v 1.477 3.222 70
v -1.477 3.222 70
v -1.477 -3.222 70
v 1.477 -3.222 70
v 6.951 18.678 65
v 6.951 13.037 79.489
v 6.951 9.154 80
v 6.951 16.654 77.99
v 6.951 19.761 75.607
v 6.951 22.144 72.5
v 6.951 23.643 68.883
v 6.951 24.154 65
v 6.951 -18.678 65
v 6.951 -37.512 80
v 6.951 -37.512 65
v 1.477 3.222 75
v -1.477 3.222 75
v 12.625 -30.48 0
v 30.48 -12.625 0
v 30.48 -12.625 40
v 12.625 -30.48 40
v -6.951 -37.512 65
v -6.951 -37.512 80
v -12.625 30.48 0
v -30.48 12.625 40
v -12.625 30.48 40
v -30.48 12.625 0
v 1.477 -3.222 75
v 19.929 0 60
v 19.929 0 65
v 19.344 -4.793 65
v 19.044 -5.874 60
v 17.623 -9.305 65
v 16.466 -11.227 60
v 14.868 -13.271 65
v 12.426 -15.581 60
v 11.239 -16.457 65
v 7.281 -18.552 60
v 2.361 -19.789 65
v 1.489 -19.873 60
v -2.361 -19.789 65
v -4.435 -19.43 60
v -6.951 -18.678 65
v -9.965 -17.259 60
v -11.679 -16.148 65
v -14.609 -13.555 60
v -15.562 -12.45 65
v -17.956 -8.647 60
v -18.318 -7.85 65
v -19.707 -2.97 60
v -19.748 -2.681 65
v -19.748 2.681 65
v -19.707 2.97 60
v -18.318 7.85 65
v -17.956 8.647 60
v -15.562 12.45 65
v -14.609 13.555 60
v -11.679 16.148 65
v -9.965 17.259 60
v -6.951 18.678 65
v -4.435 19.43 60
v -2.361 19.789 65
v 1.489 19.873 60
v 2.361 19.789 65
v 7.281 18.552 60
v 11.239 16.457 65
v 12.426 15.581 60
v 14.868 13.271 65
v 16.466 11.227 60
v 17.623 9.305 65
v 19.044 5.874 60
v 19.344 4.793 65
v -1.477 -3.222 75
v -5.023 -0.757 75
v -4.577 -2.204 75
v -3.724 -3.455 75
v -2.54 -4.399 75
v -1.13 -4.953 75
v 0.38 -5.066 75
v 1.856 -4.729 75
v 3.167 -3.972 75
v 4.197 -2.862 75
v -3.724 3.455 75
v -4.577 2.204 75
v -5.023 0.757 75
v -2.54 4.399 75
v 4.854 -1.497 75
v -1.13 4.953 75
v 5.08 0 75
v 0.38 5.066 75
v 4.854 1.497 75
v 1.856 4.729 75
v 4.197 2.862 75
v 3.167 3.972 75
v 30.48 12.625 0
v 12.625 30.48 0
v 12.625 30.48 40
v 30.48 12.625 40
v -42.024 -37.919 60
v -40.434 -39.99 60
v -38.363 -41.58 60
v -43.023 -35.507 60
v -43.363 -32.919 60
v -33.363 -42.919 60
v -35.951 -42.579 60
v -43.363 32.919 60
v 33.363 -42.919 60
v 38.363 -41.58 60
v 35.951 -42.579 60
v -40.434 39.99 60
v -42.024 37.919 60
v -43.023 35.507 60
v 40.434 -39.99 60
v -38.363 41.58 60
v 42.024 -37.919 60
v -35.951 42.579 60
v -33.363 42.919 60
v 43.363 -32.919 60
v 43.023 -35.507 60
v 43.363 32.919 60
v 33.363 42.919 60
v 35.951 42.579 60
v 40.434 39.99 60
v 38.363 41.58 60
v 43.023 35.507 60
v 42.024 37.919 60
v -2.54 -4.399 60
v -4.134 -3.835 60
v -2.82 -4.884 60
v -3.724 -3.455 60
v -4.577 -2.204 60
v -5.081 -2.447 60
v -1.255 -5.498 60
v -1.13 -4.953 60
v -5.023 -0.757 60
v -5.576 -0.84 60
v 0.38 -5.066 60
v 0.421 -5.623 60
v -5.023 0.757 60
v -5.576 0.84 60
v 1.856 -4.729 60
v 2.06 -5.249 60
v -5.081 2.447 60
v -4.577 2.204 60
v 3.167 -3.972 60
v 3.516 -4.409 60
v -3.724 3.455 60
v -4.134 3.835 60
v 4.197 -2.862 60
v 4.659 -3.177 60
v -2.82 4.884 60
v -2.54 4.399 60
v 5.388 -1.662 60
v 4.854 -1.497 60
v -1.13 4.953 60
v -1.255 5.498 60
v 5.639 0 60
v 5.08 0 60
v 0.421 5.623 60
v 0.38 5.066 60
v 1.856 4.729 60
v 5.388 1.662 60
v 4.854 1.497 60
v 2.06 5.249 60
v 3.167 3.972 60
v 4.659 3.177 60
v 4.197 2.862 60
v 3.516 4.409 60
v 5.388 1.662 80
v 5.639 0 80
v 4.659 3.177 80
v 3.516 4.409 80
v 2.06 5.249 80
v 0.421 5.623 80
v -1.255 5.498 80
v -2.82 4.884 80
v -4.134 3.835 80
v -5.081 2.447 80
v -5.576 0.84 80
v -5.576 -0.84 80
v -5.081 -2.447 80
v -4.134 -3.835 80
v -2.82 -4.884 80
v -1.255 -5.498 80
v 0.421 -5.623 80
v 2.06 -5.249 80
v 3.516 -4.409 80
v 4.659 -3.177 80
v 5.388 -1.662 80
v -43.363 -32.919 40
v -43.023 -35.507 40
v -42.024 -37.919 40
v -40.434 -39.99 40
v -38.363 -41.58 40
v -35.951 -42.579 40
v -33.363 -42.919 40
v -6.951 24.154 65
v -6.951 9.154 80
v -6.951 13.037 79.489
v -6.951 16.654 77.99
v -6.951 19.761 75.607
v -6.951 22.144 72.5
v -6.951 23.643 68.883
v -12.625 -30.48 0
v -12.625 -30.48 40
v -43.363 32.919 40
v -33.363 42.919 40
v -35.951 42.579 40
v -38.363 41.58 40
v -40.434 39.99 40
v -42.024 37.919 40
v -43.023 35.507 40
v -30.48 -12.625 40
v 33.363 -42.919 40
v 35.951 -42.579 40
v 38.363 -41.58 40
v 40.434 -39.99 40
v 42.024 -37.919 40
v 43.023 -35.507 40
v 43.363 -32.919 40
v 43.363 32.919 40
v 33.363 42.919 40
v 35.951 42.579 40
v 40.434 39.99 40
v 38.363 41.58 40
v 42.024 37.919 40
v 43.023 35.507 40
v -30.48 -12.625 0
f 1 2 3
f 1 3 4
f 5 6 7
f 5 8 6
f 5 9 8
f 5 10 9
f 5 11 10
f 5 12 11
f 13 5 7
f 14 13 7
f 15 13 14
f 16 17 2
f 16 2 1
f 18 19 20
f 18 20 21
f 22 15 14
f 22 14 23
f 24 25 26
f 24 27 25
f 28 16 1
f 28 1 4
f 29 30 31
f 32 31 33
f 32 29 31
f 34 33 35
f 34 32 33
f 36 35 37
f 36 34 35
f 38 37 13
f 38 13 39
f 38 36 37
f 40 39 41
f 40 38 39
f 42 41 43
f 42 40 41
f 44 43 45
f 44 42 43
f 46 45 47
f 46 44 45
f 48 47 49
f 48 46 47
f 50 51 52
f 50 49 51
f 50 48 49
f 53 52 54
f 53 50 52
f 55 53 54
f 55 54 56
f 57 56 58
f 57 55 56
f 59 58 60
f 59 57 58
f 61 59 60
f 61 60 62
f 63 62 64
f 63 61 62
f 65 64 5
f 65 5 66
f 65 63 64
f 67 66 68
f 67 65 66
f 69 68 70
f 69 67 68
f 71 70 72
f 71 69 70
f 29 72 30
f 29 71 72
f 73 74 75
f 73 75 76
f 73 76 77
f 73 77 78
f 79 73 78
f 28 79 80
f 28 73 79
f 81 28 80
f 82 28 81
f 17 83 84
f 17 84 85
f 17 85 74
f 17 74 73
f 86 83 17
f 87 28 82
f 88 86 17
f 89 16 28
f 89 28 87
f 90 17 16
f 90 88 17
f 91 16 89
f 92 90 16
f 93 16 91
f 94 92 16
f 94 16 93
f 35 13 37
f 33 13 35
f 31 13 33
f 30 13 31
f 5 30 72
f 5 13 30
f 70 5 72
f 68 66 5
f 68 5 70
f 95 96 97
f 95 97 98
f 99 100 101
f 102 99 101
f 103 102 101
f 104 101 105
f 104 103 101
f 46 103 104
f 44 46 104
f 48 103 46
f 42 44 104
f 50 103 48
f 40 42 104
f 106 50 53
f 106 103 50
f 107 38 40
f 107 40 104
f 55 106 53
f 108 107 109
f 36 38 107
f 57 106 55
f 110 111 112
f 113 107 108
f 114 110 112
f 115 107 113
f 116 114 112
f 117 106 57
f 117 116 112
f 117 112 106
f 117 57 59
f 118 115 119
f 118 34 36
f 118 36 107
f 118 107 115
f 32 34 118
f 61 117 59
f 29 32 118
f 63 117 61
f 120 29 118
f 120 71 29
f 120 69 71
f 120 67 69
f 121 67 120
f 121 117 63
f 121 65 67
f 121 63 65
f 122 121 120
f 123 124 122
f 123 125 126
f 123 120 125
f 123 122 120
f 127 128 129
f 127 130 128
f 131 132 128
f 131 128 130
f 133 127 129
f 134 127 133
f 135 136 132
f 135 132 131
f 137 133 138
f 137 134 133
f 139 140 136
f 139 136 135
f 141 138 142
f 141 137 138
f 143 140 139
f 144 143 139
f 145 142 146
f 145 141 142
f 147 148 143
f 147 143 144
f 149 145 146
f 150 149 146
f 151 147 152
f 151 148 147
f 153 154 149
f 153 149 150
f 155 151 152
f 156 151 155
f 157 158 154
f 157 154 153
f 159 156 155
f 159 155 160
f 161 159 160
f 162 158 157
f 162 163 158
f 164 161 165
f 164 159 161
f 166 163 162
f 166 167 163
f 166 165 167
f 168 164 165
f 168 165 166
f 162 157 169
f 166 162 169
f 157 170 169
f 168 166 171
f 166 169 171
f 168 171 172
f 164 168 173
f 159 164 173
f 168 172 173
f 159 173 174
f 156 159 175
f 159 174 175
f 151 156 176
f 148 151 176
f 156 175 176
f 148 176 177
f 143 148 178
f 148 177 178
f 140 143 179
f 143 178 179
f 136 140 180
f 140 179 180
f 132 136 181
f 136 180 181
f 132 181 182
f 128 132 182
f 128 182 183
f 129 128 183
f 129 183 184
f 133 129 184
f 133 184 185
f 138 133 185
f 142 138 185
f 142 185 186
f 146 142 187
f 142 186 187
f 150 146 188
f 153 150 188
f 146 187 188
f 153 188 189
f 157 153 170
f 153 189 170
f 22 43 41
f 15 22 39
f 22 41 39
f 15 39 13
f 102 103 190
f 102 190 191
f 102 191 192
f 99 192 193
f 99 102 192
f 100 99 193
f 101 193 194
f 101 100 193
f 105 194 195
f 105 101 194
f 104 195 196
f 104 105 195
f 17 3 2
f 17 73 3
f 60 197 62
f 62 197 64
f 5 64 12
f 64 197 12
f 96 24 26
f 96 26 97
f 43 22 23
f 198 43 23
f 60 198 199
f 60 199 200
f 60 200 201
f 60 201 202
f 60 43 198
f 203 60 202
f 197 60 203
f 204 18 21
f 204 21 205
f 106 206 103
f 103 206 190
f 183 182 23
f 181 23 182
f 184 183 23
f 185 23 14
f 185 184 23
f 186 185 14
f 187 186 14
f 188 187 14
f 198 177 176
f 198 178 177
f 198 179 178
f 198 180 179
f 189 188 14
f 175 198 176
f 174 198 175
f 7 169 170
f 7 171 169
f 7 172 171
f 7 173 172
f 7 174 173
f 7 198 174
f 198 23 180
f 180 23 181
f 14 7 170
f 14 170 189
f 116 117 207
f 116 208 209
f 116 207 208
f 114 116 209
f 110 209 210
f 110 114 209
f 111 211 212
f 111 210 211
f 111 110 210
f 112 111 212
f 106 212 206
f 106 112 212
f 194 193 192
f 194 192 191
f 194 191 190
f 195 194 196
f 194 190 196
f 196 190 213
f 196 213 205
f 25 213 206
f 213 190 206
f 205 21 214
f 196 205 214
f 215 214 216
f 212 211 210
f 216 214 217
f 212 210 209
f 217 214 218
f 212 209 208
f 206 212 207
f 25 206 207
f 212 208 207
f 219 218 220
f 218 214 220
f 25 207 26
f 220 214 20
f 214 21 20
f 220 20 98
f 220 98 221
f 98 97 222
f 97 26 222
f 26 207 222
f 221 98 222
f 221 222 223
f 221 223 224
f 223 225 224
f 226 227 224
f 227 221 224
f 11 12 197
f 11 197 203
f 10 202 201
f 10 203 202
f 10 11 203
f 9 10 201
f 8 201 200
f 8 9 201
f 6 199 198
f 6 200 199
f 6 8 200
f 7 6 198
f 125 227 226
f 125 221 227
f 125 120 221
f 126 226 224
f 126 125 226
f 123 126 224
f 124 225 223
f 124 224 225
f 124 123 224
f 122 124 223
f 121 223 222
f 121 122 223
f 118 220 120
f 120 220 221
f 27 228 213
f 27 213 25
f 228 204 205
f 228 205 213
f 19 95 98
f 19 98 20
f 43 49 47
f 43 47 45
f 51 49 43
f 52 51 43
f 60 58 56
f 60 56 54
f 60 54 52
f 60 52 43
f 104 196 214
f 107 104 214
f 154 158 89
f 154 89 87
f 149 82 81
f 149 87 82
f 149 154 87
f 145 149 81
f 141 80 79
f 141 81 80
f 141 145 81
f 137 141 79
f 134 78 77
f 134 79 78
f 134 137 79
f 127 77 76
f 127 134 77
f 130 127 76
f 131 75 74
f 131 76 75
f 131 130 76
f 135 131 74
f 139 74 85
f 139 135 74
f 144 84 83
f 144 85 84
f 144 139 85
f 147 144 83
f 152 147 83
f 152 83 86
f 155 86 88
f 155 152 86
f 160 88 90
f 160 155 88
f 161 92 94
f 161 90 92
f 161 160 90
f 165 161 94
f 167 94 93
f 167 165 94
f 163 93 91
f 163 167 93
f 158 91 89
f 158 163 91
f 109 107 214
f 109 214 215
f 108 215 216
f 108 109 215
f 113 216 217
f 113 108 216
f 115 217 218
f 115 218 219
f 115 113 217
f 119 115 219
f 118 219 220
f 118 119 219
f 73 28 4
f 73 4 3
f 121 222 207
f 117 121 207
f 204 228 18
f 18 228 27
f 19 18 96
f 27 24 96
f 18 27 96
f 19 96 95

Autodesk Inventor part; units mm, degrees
ref_plane "YZ Plane" through (0, 0, 0) normal (1, 0, 0) x (0, 1, 0)
ref_plane "XZ Plane" through (0, 0, 0) normal (0, 1, 0) x (-1, 0, 0)
ref_plane "XY Plane" through (0, 0, 0) normal (0, 0, 1) x (1, 0, 0)
sketch "Sketch1" plane through (0, 0, 0) normal (0, 0, 1) x (1, 0, 0)
  line L0 (-12.6252, -30.48) -> (-30.48, -12.6252)
  line L1 (-30.48, -12.6252) -> (-30.48, 12.6252)
  line L2 (-30.48, 12.6252) -> (-12.6252, 30.48)
  line L3 (-12.6252, 30.48) -> (12.6252, 30.48)
  line L4 (12.6252, 30.48) -> (30.48, 12.6252)
  line L5 (30.48, 12.6252) -> (30.48, -12.6252)
  line L6 (30.48, -12.6252) -> (12.6252, -30.48)
  line L7 (12.6252, -30.48) -> (-12.6252, -30.48)
  circle A0 centre (0, 0) radius 30.48
  line L8 (28.3719, -11.1385) -> (12.1858, -27.9381)
  line L9 (12.1858, -27.9381) -> (-11.1385, -28.3719)
  line L10 (-11.1385, -28.3719) -> (-27.9381, -12.1858)
  line L11 (-27.9381, -12.1858) -> (-28.3719, 11.1385)
  line L12 (-28.3719, 11.1385) -> (-12.1858, 27.9381)
  line L13 (-12.1858, 27.9381) -> (11.1385, 28.3719)
  line L14 (11.1385, 28.3719) -> (27.9381, 12.1858)
  line L15 (27.9381, 12.1858) -> (28.3719, -11.1385)
  point P0 (0, 0)
  point P1 (0, 30.48)
  dimension "d50" = 60.96
  dimension "d54" = 30.48
extrude "Extrusion1" add sketch "Sketch1" along normal blind 40
sketch "Sketch2" plane through (0, 0, 40) normal (0, 0, 1) x (1, 0, 0)
  line L0 (-43.3633, -42.9193) -> (43.3633, -42.9193)
  line L1 (43.3633, -42.9193) -> (43.3633, 42.9193)
  line L2 (43.3633, 42.9193) -> (-43.3633, 42.9193)
  line L3 (-43.3633, 42.9193) -> (-43.3633, -42.9193)
  line L4 (-43.3633, -42.9193) -> (43.3633, 42.9193) construction
  line L5 (43.3633, -42.9193) -> (-43.3633, 42.9193) construction
  point P0 (0, 0)
extrude "Extrusion2" add sketch "Sketch2" along normal blind 20
fillet "Fillet1" radius 10 4 edges at (43.3633, 42.9193, 50) (43.3633, -42.9193, 50) (-43.3633, 42.9193, 50) (-43.3633, -42.9193, 50)
sketch "Sketch3" plane through (0, 0, 60) normal (0, 0, 1) x (1, 0, 0)
  circle A0 centre (0, 0) radius 19.9292
extrude "Extrusion3" add sketch "Sketch3" along normal blind 5
sketch "Sketch4" plane through (0, 0, 65) normal (0, 0, 1) x (1, 0, 0)
  line L0 (6.9511, -37.5125) -> (-6.9511, -37.5125)
  line L1 (-6.9511, -37.5125) -> (-6.9511, 24.1539)
  line L2 (-6.9511, 24.1539) -> (6.9511, 24.1539)
  line L3 (6.9511, 24.1539) -> (6.9511, -37.5125)
  line L4 (6.9511, -37.5125) -> (-6.9511, 24.1539) construction
  line L5 (-6.9511, -37.5125) -> (6.9511, 24.1539) construction
  point P0 (0, 0)
  point P1 (0, -6.6793)
extrude "Extrusion4" add sketch "Sketch4" along normal blind 15
fillet "Fillet2" radius 15 1 edges at (0, 24.1539, 80)
sketch "Sketch5" plane through (0, 0, 80) normal (0, 0, 1) x (1, 0, 0)
  circle A0 centre (0, 0) radius 5.639
extrude "Extrusion5" cut sketch "Sketch5" against normal blind 20
sketch "Sketch6" plane through (0, 0, 60) normal (0, 0, 1) x (1, 0, 0)
  circle A0 centre (0, 0) radius 5.639 projected
  circle A1 centre (0, 0) radius 5.08
  dimension "d13" = 10.16
extrude "Extrusion6" add sketch "Sketch6" along normal blind 15 contours A1
sketch "Sketch7" plane through (0, 0, 75) normal (0, 0, 1) x (1, 0, 0)
  line L0 (1.4769, -3.2223) -> (-1.4769, -3.2223)
  line L1 (-1.4769, -3.2223) -> (-1.4769, 3.2223)
  line L2 (-1.4769, 3.2223) -> (1.4769, 3.2223)
  line L3 (1.4769, 3.2223) -> (1.4769, -3.2223)
  circle A0 centre (0, 0) radius 5.639 projected
  line L4 (1.4769, -3.2223) -> (-1.4769, 3.2223) construction
  line L5 (-1.4769, -3.2223) -> (1.4769, 3.2223) construction
extrude "Extrusion7" cut sketch "Sketch7" against normal blind 5 contours L0 L1 L2 L3
sketch "Sketch8" plane through (0, 0, 60) normal (0, 0, 1) x (1, 0, 0)
  line L0 (-9.528, 62.156) -> (8.3554, 62.156) construction
  line L1 (8.3554, 62.156) -> (8.3554, 44.2726) construction
  line L2 (8.3554, 44.2726) -> (-9.528, 44.2726) construction
  line L3 (-9.528, 44.2726) -> (-9.528, 62.156) construction
  line L4 (44.1222, 9.3815) -> (61.4167, 9.3815) construction
  line L5 (61.4167, 9.3815) -> (61.4167, -7.913) construction
  line L6 (61.4167, -7.913) -> (44.1222, -7.913) construction
  line L7 (44.1222, -7.913) -> (44.1222, 9.3815) construction
  point P0 (0, 0)
decal "Decal1"
decal "Decal2"
sketch "Sketch9" plane through (-30.48, 12.6252, 0) normal (-1, 0, 0) x (0, -1, 0)
  point P0 (12.6252, 0)
sketch "Sketch10" plane through (0, 0, 60) normal (0, 0, 1) x (1, 0, 0)
  line L0 (-5.7001, 39.3416) -> (5.3375, 39.3416) construction
  line L1 (5.3375, 39.3416) -> (5.3375, 28.3041) construction
  line L2 (5.3375, 28.3041) -> (-5.7001, 28.3041) construction
  line L3 (-5.7001, 28.3041) -> (-5.7001, 39.3416) construction
  line L4 (25.3709, 6.0354) -> (36.3058, 6.0354) construction
  line L5 (36.3058, 6.0354) -> (36.3058, -4.8995) construction
  line L6 (36.3058, -4.8995) -> (25.3709, -4.8995) construction
  line L7 (25.3709, -4.8995) -> (25.3709, 6.0354) construction
  point P0 (0, 0)
decal "Decal3"
decal "Decal4"
properties part number "gabaritna_sklopka"
